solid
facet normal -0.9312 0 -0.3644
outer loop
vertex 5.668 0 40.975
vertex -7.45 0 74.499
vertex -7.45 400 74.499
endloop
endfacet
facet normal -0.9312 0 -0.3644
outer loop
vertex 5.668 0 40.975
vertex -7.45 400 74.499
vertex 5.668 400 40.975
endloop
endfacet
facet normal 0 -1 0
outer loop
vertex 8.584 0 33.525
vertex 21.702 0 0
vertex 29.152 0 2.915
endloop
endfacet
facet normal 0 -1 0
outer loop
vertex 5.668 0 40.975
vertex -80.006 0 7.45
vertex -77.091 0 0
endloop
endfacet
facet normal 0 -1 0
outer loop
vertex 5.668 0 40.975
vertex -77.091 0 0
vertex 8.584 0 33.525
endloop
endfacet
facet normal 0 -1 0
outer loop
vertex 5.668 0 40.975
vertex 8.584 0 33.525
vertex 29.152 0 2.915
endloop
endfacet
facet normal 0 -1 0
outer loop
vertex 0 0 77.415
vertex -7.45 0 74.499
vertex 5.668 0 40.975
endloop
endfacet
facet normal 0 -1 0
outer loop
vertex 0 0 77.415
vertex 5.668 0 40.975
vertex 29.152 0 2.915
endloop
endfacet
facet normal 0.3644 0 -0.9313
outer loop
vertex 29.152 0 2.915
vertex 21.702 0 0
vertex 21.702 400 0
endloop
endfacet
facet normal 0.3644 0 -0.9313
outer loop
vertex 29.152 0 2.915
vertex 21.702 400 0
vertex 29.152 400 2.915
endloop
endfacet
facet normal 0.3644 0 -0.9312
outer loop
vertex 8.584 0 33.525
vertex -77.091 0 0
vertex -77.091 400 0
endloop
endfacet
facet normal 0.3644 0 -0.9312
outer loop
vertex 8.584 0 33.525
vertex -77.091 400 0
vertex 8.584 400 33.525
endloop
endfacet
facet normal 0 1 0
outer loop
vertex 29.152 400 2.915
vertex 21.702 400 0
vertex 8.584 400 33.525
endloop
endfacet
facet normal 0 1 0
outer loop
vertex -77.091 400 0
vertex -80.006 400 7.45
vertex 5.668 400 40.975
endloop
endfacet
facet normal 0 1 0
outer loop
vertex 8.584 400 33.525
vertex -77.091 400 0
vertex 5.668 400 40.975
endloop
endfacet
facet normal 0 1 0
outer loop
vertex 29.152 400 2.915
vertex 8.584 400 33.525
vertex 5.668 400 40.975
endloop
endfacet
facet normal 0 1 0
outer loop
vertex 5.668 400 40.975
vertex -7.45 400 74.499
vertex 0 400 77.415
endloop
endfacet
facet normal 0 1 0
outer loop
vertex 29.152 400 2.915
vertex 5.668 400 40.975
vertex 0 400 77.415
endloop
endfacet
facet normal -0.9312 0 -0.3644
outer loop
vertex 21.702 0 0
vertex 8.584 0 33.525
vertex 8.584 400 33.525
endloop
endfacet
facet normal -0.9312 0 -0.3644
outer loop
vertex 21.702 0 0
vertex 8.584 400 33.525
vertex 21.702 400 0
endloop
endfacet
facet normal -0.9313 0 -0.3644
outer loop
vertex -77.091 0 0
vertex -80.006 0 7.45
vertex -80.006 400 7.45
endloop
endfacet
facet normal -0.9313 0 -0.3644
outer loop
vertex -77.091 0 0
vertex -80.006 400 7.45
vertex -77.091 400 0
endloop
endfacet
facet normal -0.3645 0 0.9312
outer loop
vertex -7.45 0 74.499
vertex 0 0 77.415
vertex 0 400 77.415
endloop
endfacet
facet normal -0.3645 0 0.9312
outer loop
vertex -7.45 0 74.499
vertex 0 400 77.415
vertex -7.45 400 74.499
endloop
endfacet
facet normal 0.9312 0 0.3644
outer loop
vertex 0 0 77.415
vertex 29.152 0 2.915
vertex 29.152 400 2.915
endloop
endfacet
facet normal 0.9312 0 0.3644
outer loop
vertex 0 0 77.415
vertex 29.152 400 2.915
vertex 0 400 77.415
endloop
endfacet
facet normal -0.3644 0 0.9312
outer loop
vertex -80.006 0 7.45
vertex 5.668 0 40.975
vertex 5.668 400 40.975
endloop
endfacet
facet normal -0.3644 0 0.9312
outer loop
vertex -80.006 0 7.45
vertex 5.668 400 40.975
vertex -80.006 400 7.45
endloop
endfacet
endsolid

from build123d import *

# Parameters (mm, degrees)
F1_DEPTH = 400


# Not quite as in the source:
# - the program builds the solid bodies; features that only make, move or delete a surface that nothing else refers to are left out


with BuildPart() as f1:
    # F0 (on Front) → F1 (new body)
    with BuildSketch(Plane.XZ):
        Polygon((-80.0059014217, 7.4499422376), (-77.090706633, 0), (8.5836290999, 33.5247400694), (21.7020056488, 0), (29.1519478864, 2.9151947886), (0, 77.4146171651), (-7.4499422376, 74.4994223765), (5.6684343113, 40.9746823071), align=None)
    extrude(amount=-F1_DEPTH)


solid = f1.part
